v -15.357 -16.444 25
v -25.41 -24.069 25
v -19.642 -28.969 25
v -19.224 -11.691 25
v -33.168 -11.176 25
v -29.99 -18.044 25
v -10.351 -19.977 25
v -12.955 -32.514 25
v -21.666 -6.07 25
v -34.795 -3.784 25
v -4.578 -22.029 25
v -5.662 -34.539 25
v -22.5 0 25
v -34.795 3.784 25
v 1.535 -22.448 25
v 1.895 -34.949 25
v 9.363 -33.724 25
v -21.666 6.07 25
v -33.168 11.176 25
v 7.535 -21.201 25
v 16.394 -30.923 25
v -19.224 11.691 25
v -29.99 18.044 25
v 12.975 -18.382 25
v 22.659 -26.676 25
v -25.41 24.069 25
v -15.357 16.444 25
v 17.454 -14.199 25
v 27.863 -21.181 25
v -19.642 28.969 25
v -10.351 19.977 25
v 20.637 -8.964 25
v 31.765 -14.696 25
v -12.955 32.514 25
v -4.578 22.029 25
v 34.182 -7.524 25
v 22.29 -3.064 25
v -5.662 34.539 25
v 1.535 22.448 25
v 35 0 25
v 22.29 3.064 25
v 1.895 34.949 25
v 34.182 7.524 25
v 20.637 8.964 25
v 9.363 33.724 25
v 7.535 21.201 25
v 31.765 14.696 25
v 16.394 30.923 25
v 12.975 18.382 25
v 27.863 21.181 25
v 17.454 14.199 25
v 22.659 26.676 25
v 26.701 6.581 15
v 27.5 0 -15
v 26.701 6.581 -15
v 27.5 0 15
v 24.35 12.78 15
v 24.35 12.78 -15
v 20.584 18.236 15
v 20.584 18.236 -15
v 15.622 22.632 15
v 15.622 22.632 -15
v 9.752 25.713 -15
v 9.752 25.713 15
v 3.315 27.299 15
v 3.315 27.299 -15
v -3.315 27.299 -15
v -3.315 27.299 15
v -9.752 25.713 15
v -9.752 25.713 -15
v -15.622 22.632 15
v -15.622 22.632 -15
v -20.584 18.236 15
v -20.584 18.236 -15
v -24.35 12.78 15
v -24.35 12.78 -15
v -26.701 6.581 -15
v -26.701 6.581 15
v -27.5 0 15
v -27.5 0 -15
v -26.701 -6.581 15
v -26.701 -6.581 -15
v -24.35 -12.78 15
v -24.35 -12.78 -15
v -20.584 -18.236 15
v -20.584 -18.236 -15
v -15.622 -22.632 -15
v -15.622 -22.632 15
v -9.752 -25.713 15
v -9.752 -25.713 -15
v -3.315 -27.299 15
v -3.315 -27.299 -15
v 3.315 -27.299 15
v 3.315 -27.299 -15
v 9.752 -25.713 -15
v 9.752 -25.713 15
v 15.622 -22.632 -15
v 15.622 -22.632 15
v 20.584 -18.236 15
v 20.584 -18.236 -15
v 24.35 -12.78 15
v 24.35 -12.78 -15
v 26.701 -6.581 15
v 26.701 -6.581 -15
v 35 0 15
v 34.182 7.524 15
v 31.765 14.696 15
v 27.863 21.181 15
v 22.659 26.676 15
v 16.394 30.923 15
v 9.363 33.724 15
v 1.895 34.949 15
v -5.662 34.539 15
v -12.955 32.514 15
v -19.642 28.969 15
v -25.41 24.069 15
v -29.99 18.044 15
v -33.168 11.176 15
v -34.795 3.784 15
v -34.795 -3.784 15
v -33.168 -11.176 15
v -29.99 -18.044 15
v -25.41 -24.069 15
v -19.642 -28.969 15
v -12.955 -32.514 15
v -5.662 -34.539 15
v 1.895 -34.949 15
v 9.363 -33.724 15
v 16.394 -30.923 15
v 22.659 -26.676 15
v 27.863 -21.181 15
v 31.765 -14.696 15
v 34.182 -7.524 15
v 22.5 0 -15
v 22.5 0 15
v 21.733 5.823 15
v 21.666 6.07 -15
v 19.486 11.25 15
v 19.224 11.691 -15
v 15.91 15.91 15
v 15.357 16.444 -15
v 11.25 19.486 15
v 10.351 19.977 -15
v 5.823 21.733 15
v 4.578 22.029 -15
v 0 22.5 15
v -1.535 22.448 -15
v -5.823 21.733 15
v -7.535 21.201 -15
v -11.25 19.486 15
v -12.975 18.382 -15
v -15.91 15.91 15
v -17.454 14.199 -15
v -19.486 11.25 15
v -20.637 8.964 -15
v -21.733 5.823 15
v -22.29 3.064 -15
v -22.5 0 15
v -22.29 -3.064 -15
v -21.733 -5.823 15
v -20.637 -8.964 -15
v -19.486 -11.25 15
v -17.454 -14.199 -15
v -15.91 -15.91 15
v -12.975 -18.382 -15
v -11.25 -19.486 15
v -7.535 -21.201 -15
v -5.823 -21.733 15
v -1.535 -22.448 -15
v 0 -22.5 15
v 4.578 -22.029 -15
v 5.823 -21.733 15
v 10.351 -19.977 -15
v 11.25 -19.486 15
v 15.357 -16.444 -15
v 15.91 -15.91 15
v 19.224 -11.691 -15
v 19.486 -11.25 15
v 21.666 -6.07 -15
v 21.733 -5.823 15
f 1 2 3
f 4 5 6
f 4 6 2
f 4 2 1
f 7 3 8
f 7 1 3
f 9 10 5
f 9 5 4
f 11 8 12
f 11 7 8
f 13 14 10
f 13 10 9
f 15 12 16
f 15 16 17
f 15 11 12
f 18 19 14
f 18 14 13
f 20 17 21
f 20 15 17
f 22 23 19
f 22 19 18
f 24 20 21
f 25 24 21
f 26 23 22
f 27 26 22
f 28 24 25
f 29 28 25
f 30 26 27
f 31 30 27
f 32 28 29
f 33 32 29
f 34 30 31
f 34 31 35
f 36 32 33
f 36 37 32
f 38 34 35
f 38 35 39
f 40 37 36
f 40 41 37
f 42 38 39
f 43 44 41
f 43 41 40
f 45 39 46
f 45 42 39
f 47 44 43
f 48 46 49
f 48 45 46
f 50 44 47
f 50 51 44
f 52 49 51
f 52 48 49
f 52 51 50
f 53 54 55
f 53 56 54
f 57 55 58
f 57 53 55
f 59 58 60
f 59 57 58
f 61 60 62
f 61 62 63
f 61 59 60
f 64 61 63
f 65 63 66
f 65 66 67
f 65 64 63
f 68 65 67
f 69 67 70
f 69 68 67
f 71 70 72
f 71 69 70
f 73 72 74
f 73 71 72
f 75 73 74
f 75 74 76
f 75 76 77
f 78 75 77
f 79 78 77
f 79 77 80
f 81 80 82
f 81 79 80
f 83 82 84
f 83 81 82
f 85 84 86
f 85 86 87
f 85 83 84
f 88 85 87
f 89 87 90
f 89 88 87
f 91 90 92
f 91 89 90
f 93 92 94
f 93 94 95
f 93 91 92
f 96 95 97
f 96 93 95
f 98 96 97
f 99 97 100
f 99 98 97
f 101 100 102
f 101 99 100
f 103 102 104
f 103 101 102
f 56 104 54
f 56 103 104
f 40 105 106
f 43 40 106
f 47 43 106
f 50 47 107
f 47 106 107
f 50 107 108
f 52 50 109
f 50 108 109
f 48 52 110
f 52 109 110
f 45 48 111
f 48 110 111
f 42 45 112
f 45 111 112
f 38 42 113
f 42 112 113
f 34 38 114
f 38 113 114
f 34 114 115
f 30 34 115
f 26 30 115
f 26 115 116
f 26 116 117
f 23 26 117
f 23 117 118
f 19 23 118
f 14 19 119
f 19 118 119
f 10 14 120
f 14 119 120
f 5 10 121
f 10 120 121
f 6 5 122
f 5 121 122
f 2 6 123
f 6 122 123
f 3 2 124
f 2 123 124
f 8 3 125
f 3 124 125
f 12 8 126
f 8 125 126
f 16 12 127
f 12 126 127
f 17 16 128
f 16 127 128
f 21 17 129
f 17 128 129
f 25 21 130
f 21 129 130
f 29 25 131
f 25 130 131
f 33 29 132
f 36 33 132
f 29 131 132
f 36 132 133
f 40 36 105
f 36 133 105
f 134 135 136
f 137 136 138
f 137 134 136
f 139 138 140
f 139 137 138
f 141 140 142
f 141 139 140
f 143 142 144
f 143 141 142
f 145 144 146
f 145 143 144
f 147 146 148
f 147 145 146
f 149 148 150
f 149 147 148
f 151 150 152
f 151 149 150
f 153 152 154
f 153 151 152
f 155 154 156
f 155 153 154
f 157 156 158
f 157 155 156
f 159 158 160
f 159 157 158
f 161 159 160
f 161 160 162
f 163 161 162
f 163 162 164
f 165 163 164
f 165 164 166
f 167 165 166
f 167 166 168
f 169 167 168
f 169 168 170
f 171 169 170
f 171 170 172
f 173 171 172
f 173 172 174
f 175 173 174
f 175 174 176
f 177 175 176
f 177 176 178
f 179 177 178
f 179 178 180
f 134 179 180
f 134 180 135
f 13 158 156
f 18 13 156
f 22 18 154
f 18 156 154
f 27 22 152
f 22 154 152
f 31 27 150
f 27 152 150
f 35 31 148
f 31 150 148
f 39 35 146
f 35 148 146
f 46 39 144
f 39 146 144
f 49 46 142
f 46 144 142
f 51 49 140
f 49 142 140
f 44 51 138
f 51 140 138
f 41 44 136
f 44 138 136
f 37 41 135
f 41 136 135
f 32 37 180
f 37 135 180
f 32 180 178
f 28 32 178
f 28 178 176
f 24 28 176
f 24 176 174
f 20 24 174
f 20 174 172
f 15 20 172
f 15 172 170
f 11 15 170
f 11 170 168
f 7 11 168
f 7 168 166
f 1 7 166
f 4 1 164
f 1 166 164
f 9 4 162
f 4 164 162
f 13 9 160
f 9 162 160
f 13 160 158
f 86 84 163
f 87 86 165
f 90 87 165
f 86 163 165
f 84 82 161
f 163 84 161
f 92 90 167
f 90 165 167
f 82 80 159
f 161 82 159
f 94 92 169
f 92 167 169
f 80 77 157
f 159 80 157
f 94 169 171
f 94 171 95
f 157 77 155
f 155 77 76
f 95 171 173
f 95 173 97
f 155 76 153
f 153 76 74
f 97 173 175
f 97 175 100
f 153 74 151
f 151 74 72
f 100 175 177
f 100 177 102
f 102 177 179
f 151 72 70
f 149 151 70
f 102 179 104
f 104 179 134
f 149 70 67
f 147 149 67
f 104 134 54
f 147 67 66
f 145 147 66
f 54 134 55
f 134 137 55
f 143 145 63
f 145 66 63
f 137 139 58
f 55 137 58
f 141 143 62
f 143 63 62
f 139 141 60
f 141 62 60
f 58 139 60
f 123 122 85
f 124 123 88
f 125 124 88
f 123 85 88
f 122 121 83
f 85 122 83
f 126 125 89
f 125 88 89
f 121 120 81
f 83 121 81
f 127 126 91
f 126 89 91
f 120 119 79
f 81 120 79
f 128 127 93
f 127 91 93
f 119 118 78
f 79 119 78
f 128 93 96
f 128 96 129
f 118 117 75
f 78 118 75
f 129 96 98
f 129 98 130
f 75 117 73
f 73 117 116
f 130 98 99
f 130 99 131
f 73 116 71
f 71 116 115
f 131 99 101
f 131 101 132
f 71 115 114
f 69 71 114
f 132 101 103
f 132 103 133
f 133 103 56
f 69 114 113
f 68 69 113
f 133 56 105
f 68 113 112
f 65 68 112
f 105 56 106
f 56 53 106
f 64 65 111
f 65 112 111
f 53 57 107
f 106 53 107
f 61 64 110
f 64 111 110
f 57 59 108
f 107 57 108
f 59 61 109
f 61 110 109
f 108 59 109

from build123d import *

# Parameters (mm, degrees)
SKETCH2_R               = 27.5
SKETCH2_R_2             = 22.5
BOSS_EXTRUDE2_DEPTH     = 15
SKETCH3_R               = 35
BOSS_EXTRUDE3_DEPTH     = 10
SKETCH4_R               = 22.5
CUT_EXTRUDE1_DEPTH      = 31
CUT_EXTRUDE1_DEPTH_BACK = 11


with BuildPart() as part:
    # Sketch2 → Boss-Extrude2 (new body, symmetric)
    with BuildSketch(Plane.XY):
        Circle(SKETCH2_R)
        Circle(SKETCH2_R_2, mode=Mode.SUBTRACT)
    extrude(amount=BOSS_EXTRUDE2_DEPTH, both=True)

    # Sketch3 → Boss-Extrude3 (add)
    with BuildSketch(Plane.XY.offset(15)):
        Circle(SKETCH3_R)
    extrude(amount=BOSS_EXTRUDE3_DEPTH)

    # Sketch4 → Cut-Extrude1 (cut, two sides)
    with BuildSketch(Plane(origin=(0, 0, 15), x_dir=(-1, 0, 0), z_dir=(0, 0, -1))) as cut_extrude1_sk:
        Circle(SKETCH4_R)
    extrude(amount=CUT_EXTRUDE1_DEPTH, mode=Mode.SUBTRACT)
    extrude(cut_extrude1_sk.sketch, amount=-CUT_EXTRUDE1_DEPTH_BACK, mode=Mode.SUBTRACT)


solid = part.part
